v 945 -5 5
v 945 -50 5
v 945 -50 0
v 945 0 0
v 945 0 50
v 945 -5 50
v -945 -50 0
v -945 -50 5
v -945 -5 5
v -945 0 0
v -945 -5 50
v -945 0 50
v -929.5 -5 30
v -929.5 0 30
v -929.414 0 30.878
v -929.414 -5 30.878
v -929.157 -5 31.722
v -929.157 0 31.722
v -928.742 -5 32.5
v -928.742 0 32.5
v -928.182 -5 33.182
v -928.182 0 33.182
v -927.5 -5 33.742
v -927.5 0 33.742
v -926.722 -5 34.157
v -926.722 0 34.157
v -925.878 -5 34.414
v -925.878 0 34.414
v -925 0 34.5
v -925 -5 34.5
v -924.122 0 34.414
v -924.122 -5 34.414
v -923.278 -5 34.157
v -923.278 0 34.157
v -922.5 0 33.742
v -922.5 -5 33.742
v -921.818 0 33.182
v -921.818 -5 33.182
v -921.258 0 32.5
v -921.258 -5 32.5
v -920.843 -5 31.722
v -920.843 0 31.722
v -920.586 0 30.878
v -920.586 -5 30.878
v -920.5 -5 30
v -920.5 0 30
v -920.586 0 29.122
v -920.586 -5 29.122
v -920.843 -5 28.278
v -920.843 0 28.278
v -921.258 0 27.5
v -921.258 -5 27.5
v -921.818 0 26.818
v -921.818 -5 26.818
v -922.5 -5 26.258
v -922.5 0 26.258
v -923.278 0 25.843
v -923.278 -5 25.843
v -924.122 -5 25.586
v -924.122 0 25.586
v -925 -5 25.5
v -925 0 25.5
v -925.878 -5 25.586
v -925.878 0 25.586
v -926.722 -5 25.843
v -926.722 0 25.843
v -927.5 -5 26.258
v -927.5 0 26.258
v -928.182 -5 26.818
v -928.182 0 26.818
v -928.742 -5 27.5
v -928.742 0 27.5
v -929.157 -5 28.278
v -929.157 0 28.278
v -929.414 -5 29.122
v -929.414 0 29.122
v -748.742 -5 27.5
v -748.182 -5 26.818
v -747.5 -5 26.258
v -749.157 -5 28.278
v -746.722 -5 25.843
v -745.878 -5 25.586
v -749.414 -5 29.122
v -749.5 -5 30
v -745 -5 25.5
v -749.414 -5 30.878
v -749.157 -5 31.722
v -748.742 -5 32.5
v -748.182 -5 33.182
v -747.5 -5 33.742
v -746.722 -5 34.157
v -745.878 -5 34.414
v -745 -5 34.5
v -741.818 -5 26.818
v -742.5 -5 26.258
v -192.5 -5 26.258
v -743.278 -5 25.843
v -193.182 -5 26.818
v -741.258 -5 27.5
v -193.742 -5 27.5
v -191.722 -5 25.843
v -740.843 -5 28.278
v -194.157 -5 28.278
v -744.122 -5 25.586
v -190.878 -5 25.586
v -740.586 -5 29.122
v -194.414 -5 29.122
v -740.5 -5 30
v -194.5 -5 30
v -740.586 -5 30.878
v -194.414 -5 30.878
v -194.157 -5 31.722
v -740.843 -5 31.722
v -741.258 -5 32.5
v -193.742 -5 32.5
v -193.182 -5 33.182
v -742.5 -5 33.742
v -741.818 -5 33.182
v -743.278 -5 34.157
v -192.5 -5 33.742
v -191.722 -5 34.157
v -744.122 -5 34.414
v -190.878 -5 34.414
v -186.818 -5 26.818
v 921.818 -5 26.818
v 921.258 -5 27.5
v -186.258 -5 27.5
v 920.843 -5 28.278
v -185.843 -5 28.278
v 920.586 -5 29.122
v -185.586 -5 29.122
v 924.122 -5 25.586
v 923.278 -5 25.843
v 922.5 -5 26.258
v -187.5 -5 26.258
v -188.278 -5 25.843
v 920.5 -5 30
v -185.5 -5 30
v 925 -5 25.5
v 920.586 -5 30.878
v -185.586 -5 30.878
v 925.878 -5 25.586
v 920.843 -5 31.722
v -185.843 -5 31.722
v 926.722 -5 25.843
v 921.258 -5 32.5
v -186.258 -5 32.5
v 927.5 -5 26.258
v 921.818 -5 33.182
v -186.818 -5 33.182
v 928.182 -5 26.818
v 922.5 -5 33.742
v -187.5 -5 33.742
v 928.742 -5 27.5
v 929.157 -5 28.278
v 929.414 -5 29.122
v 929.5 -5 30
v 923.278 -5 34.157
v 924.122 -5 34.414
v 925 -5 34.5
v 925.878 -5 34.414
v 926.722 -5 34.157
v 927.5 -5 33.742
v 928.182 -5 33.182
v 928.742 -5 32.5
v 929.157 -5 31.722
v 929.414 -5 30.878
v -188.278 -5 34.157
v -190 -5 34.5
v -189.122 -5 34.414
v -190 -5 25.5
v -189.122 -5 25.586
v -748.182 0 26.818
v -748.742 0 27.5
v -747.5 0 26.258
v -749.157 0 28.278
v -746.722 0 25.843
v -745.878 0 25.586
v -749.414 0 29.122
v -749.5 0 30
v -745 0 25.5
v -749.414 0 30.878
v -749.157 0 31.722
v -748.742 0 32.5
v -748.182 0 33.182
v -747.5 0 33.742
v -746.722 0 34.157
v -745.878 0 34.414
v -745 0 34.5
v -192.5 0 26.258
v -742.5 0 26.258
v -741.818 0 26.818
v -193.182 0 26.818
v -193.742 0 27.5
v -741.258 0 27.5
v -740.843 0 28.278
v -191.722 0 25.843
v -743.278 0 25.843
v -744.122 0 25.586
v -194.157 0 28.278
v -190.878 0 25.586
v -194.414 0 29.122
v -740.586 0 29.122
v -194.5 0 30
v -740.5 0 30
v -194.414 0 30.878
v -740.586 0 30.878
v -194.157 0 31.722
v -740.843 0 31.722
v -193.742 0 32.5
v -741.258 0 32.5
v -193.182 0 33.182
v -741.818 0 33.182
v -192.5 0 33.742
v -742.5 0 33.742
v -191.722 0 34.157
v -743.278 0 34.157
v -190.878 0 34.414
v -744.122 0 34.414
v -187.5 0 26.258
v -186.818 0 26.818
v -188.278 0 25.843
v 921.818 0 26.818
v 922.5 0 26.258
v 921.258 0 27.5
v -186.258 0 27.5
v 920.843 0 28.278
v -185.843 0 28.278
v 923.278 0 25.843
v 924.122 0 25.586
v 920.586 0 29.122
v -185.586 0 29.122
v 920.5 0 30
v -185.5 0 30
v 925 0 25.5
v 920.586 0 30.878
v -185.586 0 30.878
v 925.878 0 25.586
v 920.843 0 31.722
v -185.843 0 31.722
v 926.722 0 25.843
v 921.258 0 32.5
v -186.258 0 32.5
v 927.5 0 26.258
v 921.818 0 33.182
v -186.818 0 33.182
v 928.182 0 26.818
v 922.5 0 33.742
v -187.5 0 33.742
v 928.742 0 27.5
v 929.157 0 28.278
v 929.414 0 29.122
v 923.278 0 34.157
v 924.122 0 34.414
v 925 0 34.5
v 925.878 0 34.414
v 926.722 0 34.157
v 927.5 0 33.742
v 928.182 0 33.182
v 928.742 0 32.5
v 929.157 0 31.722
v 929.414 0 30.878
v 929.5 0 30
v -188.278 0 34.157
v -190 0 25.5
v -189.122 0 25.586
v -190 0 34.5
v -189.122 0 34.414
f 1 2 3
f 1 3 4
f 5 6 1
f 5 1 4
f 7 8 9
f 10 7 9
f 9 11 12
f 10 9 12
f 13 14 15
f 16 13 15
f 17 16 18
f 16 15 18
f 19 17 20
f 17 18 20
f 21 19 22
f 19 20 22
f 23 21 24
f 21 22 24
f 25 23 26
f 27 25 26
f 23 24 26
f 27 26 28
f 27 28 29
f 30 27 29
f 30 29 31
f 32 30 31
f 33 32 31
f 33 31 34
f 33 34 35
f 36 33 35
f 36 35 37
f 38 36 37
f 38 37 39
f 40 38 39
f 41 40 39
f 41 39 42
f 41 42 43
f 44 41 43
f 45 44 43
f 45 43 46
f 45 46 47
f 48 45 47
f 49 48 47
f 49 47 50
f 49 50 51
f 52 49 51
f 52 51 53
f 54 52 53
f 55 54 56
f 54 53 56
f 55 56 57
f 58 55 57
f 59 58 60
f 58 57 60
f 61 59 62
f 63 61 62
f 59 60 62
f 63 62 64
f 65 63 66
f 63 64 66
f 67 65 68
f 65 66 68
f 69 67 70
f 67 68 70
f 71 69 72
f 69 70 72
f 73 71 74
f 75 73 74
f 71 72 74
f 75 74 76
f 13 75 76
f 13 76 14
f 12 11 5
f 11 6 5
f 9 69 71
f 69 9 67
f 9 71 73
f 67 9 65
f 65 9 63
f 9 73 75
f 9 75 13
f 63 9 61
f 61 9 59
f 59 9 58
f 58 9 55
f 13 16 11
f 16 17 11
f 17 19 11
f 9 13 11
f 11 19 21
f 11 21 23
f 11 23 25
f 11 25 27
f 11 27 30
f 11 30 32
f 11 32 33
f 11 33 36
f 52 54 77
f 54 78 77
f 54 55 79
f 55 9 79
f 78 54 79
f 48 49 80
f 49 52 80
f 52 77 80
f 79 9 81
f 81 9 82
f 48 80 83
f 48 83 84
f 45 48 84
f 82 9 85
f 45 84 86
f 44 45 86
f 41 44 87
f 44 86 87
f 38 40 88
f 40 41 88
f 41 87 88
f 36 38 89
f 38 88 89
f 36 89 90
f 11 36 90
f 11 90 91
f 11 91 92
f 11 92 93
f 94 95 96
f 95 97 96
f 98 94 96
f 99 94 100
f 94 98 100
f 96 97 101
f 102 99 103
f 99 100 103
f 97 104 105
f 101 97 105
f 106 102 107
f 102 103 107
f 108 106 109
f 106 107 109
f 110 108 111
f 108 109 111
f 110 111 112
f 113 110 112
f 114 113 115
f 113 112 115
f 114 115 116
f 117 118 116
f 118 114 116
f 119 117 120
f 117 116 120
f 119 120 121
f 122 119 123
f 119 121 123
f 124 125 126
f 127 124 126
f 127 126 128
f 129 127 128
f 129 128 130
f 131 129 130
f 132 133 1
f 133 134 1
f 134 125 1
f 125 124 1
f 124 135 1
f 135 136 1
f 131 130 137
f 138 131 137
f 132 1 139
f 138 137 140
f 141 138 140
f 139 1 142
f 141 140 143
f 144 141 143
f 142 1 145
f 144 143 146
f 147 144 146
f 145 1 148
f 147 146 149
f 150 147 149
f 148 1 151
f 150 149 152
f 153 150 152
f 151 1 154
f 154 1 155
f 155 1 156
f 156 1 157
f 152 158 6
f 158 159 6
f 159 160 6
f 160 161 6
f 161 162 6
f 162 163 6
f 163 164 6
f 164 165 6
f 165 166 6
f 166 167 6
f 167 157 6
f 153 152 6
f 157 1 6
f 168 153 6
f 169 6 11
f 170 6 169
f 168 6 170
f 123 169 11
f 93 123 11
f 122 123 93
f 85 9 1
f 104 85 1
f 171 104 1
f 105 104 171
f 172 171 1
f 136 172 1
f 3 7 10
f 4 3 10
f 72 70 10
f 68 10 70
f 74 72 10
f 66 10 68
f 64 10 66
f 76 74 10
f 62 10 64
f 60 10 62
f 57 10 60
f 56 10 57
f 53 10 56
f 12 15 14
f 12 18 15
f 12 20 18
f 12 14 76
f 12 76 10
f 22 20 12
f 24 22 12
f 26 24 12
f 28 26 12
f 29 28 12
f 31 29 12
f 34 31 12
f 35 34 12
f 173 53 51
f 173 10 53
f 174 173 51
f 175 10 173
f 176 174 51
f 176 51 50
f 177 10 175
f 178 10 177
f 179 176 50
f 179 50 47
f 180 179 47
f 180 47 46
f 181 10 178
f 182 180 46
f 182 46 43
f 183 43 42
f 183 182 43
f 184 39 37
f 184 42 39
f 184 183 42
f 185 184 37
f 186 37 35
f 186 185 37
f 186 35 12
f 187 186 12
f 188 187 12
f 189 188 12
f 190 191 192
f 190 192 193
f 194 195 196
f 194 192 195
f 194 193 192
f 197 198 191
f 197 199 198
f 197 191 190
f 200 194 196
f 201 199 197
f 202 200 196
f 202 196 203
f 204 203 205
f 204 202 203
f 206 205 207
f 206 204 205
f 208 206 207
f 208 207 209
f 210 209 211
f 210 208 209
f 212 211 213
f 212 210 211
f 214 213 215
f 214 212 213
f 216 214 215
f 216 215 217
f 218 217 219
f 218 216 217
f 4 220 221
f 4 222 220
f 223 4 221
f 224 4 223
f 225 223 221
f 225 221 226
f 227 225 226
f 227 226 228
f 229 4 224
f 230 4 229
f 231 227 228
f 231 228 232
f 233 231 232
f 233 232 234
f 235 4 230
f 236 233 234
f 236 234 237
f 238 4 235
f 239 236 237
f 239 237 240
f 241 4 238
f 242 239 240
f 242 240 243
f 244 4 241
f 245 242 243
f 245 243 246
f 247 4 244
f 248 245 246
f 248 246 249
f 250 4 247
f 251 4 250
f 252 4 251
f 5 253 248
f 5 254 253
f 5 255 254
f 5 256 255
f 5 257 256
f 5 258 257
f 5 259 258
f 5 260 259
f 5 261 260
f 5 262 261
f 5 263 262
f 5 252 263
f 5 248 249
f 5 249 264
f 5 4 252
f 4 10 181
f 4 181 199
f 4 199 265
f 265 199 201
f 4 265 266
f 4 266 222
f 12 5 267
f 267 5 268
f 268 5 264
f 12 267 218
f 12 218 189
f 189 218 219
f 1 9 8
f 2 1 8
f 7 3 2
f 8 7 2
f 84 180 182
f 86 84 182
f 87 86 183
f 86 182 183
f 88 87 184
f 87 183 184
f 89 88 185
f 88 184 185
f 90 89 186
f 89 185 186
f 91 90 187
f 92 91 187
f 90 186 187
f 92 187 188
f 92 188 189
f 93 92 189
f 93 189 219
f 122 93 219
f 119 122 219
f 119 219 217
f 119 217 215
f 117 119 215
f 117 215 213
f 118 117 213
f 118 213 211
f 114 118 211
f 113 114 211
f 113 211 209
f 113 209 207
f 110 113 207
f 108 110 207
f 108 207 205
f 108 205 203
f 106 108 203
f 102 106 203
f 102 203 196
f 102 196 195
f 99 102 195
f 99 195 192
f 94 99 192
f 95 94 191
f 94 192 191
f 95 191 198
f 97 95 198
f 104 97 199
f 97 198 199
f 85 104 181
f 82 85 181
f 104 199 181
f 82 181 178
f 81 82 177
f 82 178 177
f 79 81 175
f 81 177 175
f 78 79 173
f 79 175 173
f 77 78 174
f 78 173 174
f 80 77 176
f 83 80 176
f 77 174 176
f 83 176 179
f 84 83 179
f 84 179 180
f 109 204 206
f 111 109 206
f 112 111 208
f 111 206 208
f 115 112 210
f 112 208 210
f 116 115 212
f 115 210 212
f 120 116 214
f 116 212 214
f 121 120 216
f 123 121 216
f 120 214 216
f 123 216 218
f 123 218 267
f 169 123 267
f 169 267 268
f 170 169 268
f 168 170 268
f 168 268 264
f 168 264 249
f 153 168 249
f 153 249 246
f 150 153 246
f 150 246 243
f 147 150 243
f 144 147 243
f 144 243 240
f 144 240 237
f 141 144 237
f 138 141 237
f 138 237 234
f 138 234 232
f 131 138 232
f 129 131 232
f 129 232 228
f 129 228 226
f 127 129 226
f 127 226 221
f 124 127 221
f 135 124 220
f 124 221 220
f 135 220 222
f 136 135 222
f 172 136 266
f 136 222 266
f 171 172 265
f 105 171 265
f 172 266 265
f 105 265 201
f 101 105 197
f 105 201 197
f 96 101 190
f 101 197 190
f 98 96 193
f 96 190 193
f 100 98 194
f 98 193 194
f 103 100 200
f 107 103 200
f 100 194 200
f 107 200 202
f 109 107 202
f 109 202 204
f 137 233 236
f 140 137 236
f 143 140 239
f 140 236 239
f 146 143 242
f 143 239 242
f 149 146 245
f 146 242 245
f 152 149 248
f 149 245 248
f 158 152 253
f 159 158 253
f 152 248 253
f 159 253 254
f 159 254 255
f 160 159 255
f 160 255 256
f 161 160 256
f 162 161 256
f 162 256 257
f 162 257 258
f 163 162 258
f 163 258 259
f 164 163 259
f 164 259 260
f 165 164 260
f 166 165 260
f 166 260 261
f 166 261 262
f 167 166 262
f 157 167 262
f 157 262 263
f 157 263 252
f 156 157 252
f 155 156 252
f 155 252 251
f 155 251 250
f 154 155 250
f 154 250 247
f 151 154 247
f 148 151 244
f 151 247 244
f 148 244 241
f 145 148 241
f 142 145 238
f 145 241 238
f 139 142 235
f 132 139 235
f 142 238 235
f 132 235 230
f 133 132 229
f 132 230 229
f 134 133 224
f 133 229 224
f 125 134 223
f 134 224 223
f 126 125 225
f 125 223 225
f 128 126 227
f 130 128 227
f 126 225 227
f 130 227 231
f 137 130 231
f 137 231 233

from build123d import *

# Parameters (mm, degrees)
F0_W     = 45
F0_H     = 5
F0_W_2   = 5
F0_H_2   = 45
F1_DEPTH = 945
F2_W     = 1890
F2_H     = 45
F3_DEPTH = 5
F4_D     = 9


with BuildPart() as f1:
    # F0 (on Right) → F1 (new body, symmetric)
    with BuildSketch(Plane.YZ):
        with Locations((-27.5, 2.5)):
            Rectangle(F0_W, F0_H)
        with Locations((-2.5, 2.5)):
            Rectangle(F0_W_2, F0_H)
        with Locations((-2.5, 27.5)):
            Rectangle(F0_W_2, F0_H_2)
    extrude(amount=F1_DEPTH, both=True)

    # F2 (on face) → F3 (join)
    with BuildSketch(Plane.XZ.offset(5)):
        with Locations((0, 27.5)):
            Rectangle(F2_W, F2_H)
    extrude(amount=-F3_DEPTH)

    # F4 (through all)
    with Locations(Plane.XZ.offset(5)):
        with Locations((-925, 30), (-745, 30), (-190, 30), (925, 30)):
            Hole(F4_D / 2)


solid = f1.part
